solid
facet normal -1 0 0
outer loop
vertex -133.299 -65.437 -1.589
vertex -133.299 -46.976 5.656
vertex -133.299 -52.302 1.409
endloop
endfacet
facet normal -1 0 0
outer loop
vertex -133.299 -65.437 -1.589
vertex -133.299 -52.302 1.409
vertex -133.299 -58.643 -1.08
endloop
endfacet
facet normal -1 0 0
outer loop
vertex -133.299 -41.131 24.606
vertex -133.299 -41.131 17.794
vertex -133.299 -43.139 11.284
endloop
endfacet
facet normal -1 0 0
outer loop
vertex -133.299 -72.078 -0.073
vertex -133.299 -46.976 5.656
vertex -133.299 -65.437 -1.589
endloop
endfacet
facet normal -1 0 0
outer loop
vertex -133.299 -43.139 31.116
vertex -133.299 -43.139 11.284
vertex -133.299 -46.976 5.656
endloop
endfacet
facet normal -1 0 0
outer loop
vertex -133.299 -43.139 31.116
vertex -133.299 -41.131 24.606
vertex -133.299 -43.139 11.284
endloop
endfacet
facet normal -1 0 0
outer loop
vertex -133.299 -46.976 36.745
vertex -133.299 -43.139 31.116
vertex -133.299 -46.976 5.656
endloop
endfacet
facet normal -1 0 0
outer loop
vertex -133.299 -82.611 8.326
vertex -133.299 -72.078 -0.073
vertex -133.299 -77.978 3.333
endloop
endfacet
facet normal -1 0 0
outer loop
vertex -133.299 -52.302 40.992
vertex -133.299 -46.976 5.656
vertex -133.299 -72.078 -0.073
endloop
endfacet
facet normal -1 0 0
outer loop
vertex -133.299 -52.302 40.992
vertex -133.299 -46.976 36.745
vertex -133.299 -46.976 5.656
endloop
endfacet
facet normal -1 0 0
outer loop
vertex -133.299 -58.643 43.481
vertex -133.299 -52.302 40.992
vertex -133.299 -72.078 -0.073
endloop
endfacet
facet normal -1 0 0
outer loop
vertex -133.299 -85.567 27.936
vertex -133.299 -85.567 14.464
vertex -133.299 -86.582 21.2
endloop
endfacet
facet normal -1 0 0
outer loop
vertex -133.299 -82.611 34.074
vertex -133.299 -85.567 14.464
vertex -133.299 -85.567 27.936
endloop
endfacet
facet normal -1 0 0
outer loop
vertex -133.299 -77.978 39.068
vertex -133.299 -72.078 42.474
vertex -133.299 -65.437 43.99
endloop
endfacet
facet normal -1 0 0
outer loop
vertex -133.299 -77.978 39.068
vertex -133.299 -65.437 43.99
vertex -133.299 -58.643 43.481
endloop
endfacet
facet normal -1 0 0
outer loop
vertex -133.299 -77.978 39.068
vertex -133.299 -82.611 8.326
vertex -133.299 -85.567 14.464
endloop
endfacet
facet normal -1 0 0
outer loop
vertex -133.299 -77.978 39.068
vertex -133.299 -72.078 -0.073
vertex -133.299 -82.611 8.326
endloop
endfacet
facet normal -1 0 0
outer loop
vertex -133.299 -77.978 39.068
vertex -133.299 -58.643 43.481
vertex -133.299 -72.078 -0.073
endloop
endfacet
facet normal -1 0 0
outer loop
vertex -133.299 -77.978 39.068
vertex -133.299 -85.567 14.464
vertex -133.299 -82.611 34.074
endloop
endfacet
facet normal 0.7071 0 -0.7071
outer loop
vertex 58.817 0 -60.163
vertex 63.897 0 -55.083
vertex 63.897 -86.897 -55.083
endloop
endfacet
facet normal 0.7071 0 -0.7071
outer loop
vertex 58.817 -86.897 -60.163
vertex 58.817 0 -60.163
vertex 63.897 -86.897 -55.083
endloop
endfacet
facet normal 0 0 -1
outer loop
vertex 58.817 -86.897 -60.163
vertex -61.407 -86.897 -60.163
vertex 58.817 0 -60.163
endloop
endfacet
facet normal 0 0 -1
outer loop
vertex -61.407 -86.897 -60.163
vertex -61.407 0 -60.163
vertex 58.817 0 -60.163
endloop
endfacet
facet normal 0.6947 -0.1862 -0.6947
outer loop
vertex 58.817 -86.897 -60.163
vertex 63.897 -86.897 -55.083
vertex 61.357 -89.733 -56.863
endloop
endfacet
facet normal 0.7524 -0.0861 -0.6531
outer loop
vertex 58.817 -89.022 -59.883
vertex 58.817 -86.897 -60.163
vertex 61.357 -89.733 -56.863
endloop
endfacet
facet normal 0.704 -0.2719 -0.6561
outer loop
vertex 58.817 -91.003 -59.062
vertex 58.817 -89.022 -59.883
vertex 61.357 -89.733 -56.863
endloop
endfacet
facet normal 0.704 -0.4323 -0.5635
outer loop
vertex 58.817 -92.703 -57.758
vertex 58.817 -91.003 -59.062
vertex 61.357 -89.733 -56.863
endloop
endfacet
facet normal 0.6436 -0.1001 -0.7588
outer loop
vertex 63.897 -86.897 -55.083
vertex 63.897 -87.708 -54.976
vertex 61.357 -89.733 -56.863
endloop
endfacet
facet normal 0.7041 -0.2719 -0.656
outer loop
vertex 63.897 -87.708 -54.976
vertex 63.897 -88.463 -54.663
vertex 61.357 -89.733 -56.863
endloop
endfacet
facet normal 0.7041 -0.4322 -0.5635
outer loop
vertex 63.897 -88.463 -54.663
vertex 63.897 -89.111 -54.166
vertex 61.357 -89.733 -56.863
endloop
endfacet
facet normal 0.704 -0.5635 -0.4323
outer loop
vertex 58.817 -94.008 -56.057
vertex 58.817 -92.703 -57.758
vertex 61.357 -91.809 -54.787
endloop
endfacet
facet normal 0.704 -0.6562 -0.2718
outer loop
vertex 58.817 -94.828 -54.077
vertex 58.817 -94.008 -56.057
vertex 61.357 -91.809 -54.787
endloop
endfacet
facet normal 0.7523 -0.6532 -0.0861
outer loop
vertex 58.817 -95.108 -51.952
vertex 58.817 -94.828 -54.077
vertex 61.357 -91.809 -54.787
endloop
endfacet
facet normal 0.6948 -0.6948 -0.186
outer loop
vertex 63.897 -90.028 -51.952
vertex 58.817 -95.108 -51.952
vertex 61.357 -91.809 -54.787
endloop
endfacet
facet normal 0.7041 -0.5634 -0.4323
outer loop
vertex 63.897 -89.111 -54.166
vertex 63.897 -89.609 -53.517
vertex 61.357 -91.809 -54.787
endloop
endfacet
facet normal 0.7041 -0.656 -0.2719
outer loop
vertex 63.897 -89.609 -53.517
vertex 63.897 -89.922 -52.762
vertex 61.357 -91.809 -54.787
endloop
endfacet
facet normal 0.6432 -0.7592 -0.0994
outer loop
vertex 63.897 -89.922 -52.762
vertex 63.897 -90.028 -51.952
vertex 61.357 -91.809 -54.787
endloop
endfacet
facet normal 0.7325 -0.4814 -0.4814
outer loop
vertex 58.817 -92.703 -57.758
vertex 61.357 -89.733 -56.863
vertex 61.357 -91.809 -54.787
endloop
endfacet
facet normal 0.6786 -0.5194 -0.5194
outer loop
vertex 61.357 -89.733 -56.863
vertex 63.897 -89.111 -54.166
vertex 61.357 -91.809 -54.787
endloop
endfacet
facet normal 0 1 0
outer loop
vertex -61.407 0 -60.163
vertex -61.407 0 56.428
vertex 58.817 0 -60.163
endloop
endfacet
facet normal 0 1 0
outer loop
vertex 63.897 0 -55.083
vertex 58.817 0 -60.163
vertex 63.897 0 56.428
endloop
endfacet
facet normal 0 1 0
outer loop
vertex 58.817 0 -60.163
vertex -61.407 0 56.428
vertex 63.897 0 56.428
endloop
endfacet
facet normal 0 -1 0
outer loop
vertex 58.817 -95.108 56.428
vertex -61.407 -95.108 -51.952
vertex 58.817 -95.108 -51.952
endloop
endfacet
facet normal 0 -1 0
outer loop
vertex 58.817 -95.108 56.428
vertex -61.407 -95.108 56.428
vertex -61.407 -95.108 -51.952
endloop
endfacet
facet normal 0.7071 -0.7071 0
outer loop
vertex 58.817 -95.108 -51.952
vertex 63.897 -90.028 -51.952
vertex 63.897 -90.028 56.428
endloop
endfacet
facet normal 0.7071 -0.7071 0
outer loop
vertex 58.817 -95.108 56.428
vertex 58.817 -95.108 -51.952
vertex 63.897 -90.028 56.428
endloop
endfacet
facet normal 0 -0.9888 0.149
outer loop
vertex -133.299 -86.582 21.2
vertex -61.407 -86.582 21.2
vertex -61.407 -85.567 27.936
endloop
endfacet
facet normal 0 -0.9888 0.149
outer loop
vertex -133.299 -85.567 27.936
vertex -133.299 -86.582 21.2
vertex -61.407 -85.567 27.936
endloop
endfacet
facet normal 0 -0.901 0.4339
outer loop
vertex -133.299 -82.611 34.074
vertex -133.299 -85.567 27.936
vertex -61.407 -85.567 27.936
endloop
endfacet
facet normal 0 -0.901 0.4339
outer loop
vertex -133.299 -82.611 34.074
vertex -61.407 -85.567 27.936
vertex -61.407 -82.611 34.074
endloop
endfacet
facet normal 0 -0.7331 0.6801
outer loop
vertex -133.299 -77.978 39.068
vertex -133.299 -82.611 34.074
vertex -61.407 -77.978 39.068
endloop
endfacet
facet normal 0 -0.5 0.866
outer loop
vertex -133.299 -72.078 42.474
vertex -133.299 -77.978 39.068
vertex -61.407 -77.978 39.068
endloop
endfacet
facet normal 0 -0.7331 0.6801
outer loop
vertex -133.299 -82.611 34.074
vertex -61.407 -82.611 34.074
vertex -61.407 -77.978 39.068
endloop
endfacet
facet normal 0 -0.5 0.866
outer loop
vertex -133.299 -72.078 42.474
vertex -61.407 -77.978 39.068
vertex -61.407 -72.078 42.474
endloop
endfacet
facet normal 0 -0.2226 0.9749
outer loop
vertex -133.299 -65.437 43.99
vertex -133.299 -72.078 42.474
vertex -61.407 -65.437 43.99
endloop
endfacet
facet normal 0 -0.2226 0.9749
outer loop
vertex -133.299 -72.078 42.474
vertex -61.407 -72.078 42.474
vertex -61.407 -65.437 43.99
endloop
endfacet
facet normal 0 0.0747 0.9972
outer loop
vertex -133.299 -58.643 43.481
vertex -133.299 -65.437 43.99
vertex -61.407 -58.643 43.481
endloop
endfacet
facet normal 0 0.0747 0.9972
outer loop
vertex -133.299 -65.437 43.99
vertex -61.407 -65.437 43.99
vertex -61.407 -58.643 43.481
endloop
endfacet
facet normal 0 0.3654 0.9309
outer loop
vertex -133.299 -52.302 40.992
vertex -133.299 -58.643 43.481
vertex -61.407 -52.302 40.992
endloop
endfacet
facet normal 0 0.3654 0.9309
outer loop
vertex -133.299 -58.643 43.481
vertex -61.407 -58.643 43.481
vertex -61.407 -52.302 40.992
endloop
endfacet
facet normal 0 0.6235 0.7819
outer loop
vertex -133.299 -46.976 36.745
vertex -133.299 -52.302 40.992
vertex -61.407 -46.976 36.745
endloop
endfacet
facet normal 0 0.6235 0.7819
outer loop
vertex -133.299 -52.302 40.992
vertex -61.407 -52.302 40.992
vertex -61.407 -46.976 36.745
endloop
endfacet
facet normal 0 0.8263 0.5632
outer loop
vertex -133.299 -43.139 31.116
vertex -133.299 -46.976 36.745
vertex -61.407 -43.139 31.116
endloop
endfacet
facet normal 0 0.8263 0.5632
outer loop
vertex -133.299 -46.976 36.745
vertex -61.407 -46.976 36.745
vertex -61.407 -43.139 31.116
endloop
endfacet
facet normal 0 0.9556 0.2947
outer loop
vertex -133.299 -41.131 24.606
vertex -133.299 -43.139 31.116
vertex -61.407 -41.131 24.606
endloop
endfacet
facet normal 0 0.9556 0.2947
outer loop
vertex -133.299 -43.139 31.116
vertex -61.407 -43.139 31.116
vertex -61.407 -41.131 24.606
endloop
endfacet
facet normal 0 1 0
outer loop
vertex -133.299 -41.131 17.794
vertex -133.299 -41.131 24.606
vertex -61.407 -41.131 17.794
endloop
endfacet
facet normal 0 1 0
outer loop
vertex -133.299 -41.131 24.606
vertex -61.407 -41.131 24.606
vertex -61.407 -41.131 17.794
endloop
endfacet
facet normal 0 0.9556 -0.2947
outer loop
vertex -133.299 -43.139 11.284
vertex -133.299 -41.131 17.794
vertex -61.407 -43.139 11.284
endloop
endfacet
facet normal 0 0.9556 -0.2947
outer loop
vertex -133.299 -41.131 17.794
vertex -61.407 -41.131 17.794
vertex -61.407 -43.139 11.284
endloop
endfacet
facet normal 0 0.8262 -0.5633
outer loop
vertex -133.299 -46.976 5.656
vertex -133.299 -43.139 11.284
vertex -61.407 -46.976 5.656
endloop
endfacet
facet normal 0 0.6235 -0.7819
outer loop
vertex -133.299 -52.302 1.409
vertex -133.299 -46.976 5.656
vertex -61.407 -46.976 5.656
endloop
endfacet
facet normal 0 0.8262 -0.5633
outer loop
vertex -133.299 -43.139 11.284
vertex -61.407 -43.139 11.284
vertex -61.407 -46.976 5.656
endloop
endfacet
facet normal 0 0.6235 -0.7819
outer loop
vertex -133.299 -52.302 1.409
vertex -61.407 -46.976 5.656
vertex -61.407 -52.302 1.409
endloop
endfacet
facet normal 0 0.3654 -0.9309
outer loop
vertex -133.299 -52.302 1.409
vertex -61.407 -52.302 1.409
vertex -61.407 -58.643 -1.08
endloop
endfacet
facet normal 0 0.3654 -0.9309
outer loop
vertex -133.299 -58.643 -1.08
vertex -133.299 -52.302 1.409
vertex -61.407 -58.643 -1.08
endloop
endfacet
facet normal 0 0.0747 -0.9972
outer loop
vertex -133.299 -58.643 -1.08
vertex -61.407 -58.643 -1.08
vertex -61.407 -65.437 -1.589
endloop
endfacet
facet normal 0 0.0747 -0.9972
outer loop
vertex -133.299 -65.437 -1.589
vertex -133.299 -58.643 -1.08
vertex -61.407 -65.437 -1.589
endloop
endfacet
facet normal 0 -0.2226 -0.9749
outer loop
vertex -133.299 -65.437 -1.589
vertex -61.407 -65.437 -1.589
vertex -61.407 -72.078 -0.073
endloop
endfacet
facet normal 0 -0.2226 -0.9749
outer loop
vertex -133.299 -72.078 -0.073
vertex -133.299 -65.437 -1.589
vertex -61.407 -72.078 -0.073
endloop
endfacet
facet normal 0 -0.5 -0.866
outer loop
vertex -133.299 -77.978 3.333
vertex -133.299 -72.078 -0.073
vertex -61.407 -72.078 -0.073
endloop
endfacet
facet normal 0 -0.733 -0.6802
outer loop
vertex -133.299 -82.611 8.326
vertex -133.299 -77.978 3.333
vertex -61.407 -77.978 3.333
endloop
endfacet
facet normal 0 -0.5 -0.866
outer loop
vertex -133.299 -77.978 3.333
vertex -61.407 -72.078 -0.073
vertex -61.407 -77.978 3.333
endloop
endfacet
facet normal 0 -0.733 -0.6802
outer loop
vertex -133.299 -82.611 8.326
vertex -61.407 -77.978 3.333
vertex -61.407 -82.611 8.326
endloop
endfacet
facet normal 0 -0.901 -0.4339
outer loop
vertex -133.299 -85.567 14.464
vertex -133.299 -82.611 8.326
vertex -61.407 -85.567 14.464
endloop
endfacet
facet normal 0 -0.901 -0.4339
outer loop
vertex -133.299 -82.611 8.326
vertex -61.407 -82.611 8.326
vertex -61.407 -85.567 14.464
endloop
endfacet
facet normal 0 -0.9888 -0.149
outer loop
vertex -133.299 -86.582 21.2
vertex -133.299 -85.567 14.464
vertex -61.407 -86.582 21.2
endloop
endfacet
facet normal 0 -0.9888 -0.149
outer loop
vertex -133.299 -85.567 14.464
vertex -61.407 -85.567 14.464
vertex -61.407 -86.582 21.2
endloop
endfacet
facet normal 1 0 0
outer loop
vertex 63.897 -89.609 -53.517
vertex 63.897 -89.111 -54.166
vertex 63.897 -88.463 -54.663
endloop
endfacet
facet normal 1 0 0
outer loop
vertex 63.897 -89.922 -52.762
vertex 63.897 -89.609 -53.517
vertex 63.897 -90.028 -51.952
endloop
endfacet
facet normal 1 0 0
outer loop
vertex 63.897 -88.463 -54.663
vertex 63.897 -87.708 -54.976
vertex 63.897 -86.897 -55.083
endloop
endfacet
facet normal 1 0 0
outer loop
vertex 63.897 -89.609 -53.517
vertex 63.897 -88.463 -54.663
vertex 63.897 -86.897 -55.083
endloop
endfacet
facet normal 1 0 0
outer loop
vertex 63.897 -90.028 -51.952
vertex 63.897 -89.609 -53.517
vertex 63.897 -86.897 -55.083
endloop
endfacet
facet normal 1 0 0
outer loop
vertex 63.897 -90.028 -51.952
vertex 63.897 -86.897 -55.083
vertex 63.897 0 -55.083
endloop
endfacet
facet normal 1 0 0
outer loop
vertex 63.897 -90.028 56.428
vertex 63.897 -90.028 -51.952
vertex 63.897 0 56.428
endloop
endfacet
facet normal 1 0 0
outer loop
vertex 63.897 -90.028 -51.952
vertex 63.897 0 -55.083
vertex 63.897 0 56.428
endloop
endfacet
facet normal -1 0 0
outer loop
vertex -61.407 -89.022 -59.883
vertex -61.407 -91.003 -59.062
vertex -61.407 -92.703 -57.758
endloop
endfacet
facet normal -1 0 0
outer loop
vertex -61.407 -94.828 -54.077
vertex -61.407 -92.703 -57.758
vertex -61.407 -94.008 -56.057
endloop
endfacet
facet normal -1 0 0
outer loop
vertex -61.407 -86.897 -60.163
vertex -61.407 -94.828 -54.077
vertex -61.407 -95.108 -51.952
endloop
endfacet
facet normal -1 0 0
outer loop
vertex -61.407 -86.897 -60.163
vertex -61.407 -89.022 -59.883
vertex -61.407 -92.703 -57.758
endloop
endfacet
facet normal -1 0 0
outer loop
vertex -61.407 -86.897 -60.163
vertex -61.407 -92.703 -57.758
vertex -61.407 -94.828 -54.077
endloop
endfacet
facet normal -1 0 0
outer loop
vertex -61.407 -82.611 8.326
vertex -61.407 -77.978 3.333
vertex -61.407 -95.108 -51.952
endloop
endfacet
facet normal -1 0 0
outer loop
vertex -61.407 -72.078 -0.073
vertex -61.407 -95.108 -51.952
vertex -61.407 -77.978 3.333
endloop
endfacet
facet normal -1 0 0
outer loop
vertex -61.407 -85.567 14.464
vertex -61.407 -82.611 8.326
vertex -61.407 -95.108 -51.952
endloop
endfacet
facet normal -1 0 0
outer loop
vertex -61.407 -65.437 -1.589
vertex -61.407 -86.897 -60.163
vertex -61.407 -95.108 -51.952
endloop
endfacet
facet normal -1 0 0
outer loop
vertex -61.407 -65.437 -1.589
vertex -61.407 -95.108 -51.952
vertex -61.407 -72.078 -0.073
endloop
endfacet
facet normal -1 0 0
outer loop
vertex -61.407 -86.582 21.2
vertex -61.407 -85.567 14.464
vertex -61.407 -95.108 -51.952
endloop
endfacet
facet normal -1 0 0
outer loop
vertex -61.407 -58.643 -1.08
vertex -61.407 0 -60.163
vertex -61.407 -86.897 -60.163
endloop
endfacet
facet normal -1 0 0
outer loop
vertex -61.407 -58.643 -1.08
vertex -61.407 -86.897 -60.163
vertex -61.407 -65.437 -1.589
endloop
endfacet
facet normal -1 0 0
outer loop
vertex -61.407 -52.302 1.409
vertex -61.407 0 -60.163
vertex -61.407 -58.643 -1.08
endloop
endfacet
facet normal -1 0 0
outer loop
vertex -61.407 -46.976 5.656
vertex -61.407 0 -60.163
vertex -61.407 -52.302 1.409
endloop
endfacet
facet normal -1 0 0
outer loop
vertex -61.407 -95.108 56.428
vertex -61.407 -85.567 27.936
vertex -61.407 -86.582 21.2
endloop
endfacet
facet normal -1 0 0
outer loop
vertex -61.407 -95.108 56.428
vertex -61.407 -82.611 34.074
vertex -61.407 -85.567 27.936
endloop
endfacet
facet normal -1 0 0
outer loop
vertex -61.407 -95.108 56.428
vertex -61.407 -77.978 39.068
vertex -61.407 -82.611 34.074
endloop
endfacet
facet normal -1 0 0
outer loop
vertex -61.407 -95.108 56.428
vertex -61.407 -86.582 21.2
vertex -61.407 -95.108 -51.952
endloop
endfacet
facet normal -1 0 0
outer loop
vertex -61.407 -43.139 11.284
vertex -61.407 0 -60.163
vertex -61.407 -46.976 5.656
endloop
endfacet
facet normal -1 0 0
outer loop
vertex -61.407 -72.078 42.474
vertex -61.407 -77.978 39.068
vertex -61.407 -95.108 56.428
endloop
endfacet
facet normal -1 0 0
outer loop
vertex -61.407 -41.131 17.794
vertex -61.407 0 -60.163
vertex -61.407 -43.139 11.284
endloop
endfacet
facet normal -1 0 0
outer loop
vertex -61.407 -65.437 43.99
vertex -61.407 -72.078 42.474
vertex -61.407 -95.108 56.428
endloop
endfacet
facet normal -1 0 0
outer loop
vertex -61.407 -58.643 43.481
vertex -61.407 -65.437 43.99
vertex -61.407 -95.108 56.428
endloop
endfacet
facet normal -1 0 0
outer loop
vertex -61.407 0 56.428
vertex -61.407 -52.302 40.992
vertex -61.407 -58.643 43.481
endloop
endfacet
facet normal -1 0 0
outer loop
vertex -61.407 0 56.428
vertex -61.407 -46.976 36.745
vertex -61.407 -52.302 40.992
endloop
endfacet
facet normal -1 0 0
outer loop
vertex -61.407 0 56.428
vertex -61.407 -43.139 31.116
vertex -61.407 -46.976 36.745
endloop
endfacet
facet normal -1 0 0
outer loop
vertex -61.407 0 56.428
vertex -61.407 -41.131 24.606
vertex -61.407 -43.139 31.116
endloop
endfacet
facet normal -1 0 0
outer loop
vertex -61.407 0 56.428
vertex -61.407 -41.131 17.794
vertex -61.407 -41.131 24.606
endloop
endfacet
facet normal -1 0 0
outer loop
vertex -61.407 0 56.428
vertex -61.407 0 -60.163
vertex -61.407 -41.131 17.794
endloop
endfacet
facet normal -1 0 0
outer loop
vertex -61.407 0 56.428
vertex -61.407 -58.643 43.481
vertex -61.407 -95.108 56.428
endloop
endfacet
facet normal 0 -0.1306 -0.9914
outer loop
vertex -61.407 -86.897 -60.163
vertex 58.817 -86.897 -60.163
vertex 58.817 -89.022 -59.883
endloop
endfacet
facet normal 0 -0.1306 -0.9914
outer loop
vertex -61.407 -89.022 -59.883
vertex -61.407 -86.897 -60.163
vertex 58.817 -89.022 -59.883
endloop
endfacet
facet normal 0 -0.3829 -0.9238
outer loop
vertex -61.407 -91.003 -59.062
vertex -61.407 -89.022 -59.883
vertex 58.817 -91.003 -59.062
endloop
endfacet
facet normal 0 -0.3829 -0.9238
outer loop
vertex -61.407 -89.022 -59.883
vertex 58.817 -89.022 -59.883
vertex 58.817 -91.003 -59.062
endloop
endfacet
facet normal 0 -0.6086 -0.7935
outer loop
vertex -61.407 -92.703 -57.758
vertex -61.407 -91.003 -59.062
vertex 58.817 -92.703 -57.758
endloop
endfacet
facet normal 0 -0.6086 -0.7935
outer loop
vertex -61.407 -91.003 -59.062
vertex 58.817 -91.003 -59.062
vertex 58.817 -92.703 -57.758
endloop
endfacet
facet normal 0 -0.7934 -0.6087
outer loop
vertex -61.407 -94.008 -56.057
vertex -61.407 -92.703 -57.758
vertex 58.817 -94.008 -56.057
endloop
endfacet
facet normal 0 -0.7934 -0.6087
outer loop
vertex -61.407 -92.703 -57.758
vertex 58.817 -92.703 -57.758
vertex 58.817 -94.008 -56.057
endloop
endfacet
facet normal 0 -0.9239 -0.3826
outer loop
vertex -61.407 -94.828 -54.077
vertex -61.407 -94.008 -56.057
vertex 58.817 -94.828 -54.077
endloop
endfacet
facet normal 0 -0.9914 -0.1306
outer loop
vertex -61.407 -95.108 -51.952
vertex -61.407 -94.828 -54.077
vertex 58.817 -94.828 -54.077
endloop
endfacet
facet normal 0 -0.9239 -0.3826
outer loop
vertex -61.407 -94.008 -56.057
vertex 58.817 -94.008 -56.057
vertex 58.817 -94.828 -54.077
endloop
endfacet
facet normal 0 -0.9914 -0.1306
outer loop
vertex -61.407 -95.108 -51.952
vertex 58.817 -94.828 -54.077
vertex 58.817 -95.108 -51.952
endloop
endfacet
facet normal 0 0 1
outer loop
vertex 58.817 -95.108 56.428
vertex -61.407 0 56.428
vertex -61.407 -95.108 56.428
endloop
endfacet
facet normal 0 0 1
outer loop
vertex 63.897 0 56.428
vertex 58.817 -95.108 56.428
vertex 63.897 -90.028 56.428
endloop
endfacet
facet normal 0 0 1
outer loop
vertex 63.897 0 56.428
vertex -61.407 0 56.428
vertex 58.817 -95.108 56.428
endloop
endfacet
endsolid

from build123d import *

# Parameters (mm, degrees)
F0_W     = 125.304118
F0_H     = 116.59091
F1_DEPTH = 95.108278
F2_R     = 8.21097
F3_SIZE  = 5.08
F4_R     = 22.853538
F5_DEPTH = 71.891591


with BuildPart() as f1:
    # F0 (on Front) → F1 (new body)
    with BuildSketch(Plane.XZ):
        with Locations((1.244716, -1.867104)):
            Rectangle(F0_W, F0_H)
    extrude(amount=F1_DEPTH)

    # F2
    f2_edges = [f1.edges().sort_by_distance(p)[0] for p in [
        (1.244716, -95.108278, -60.162559),
    ]]
    fillet(f2_edges, radius=F2_R)

    # F3
    f3_edges = [f1.edges().sort_by_distance(p)[0] for p in [
        (63.896775, -95.108278, 2.238381),
    ]]
    chamfer(f3_edges, length=F3_SIZE)

    # F4 (on face) → F5 (join)
    with BuildSketch(Plane(origin=(-61.407343, 0, 0), x_dir=(0, -1, 0), z_dir=(-1, 0, 0))):
        with Locations((63.728884, 21.200262)):
            Circle(F4_R)
    extrude(amount=F5_DEPTH)


solid = f1.part
